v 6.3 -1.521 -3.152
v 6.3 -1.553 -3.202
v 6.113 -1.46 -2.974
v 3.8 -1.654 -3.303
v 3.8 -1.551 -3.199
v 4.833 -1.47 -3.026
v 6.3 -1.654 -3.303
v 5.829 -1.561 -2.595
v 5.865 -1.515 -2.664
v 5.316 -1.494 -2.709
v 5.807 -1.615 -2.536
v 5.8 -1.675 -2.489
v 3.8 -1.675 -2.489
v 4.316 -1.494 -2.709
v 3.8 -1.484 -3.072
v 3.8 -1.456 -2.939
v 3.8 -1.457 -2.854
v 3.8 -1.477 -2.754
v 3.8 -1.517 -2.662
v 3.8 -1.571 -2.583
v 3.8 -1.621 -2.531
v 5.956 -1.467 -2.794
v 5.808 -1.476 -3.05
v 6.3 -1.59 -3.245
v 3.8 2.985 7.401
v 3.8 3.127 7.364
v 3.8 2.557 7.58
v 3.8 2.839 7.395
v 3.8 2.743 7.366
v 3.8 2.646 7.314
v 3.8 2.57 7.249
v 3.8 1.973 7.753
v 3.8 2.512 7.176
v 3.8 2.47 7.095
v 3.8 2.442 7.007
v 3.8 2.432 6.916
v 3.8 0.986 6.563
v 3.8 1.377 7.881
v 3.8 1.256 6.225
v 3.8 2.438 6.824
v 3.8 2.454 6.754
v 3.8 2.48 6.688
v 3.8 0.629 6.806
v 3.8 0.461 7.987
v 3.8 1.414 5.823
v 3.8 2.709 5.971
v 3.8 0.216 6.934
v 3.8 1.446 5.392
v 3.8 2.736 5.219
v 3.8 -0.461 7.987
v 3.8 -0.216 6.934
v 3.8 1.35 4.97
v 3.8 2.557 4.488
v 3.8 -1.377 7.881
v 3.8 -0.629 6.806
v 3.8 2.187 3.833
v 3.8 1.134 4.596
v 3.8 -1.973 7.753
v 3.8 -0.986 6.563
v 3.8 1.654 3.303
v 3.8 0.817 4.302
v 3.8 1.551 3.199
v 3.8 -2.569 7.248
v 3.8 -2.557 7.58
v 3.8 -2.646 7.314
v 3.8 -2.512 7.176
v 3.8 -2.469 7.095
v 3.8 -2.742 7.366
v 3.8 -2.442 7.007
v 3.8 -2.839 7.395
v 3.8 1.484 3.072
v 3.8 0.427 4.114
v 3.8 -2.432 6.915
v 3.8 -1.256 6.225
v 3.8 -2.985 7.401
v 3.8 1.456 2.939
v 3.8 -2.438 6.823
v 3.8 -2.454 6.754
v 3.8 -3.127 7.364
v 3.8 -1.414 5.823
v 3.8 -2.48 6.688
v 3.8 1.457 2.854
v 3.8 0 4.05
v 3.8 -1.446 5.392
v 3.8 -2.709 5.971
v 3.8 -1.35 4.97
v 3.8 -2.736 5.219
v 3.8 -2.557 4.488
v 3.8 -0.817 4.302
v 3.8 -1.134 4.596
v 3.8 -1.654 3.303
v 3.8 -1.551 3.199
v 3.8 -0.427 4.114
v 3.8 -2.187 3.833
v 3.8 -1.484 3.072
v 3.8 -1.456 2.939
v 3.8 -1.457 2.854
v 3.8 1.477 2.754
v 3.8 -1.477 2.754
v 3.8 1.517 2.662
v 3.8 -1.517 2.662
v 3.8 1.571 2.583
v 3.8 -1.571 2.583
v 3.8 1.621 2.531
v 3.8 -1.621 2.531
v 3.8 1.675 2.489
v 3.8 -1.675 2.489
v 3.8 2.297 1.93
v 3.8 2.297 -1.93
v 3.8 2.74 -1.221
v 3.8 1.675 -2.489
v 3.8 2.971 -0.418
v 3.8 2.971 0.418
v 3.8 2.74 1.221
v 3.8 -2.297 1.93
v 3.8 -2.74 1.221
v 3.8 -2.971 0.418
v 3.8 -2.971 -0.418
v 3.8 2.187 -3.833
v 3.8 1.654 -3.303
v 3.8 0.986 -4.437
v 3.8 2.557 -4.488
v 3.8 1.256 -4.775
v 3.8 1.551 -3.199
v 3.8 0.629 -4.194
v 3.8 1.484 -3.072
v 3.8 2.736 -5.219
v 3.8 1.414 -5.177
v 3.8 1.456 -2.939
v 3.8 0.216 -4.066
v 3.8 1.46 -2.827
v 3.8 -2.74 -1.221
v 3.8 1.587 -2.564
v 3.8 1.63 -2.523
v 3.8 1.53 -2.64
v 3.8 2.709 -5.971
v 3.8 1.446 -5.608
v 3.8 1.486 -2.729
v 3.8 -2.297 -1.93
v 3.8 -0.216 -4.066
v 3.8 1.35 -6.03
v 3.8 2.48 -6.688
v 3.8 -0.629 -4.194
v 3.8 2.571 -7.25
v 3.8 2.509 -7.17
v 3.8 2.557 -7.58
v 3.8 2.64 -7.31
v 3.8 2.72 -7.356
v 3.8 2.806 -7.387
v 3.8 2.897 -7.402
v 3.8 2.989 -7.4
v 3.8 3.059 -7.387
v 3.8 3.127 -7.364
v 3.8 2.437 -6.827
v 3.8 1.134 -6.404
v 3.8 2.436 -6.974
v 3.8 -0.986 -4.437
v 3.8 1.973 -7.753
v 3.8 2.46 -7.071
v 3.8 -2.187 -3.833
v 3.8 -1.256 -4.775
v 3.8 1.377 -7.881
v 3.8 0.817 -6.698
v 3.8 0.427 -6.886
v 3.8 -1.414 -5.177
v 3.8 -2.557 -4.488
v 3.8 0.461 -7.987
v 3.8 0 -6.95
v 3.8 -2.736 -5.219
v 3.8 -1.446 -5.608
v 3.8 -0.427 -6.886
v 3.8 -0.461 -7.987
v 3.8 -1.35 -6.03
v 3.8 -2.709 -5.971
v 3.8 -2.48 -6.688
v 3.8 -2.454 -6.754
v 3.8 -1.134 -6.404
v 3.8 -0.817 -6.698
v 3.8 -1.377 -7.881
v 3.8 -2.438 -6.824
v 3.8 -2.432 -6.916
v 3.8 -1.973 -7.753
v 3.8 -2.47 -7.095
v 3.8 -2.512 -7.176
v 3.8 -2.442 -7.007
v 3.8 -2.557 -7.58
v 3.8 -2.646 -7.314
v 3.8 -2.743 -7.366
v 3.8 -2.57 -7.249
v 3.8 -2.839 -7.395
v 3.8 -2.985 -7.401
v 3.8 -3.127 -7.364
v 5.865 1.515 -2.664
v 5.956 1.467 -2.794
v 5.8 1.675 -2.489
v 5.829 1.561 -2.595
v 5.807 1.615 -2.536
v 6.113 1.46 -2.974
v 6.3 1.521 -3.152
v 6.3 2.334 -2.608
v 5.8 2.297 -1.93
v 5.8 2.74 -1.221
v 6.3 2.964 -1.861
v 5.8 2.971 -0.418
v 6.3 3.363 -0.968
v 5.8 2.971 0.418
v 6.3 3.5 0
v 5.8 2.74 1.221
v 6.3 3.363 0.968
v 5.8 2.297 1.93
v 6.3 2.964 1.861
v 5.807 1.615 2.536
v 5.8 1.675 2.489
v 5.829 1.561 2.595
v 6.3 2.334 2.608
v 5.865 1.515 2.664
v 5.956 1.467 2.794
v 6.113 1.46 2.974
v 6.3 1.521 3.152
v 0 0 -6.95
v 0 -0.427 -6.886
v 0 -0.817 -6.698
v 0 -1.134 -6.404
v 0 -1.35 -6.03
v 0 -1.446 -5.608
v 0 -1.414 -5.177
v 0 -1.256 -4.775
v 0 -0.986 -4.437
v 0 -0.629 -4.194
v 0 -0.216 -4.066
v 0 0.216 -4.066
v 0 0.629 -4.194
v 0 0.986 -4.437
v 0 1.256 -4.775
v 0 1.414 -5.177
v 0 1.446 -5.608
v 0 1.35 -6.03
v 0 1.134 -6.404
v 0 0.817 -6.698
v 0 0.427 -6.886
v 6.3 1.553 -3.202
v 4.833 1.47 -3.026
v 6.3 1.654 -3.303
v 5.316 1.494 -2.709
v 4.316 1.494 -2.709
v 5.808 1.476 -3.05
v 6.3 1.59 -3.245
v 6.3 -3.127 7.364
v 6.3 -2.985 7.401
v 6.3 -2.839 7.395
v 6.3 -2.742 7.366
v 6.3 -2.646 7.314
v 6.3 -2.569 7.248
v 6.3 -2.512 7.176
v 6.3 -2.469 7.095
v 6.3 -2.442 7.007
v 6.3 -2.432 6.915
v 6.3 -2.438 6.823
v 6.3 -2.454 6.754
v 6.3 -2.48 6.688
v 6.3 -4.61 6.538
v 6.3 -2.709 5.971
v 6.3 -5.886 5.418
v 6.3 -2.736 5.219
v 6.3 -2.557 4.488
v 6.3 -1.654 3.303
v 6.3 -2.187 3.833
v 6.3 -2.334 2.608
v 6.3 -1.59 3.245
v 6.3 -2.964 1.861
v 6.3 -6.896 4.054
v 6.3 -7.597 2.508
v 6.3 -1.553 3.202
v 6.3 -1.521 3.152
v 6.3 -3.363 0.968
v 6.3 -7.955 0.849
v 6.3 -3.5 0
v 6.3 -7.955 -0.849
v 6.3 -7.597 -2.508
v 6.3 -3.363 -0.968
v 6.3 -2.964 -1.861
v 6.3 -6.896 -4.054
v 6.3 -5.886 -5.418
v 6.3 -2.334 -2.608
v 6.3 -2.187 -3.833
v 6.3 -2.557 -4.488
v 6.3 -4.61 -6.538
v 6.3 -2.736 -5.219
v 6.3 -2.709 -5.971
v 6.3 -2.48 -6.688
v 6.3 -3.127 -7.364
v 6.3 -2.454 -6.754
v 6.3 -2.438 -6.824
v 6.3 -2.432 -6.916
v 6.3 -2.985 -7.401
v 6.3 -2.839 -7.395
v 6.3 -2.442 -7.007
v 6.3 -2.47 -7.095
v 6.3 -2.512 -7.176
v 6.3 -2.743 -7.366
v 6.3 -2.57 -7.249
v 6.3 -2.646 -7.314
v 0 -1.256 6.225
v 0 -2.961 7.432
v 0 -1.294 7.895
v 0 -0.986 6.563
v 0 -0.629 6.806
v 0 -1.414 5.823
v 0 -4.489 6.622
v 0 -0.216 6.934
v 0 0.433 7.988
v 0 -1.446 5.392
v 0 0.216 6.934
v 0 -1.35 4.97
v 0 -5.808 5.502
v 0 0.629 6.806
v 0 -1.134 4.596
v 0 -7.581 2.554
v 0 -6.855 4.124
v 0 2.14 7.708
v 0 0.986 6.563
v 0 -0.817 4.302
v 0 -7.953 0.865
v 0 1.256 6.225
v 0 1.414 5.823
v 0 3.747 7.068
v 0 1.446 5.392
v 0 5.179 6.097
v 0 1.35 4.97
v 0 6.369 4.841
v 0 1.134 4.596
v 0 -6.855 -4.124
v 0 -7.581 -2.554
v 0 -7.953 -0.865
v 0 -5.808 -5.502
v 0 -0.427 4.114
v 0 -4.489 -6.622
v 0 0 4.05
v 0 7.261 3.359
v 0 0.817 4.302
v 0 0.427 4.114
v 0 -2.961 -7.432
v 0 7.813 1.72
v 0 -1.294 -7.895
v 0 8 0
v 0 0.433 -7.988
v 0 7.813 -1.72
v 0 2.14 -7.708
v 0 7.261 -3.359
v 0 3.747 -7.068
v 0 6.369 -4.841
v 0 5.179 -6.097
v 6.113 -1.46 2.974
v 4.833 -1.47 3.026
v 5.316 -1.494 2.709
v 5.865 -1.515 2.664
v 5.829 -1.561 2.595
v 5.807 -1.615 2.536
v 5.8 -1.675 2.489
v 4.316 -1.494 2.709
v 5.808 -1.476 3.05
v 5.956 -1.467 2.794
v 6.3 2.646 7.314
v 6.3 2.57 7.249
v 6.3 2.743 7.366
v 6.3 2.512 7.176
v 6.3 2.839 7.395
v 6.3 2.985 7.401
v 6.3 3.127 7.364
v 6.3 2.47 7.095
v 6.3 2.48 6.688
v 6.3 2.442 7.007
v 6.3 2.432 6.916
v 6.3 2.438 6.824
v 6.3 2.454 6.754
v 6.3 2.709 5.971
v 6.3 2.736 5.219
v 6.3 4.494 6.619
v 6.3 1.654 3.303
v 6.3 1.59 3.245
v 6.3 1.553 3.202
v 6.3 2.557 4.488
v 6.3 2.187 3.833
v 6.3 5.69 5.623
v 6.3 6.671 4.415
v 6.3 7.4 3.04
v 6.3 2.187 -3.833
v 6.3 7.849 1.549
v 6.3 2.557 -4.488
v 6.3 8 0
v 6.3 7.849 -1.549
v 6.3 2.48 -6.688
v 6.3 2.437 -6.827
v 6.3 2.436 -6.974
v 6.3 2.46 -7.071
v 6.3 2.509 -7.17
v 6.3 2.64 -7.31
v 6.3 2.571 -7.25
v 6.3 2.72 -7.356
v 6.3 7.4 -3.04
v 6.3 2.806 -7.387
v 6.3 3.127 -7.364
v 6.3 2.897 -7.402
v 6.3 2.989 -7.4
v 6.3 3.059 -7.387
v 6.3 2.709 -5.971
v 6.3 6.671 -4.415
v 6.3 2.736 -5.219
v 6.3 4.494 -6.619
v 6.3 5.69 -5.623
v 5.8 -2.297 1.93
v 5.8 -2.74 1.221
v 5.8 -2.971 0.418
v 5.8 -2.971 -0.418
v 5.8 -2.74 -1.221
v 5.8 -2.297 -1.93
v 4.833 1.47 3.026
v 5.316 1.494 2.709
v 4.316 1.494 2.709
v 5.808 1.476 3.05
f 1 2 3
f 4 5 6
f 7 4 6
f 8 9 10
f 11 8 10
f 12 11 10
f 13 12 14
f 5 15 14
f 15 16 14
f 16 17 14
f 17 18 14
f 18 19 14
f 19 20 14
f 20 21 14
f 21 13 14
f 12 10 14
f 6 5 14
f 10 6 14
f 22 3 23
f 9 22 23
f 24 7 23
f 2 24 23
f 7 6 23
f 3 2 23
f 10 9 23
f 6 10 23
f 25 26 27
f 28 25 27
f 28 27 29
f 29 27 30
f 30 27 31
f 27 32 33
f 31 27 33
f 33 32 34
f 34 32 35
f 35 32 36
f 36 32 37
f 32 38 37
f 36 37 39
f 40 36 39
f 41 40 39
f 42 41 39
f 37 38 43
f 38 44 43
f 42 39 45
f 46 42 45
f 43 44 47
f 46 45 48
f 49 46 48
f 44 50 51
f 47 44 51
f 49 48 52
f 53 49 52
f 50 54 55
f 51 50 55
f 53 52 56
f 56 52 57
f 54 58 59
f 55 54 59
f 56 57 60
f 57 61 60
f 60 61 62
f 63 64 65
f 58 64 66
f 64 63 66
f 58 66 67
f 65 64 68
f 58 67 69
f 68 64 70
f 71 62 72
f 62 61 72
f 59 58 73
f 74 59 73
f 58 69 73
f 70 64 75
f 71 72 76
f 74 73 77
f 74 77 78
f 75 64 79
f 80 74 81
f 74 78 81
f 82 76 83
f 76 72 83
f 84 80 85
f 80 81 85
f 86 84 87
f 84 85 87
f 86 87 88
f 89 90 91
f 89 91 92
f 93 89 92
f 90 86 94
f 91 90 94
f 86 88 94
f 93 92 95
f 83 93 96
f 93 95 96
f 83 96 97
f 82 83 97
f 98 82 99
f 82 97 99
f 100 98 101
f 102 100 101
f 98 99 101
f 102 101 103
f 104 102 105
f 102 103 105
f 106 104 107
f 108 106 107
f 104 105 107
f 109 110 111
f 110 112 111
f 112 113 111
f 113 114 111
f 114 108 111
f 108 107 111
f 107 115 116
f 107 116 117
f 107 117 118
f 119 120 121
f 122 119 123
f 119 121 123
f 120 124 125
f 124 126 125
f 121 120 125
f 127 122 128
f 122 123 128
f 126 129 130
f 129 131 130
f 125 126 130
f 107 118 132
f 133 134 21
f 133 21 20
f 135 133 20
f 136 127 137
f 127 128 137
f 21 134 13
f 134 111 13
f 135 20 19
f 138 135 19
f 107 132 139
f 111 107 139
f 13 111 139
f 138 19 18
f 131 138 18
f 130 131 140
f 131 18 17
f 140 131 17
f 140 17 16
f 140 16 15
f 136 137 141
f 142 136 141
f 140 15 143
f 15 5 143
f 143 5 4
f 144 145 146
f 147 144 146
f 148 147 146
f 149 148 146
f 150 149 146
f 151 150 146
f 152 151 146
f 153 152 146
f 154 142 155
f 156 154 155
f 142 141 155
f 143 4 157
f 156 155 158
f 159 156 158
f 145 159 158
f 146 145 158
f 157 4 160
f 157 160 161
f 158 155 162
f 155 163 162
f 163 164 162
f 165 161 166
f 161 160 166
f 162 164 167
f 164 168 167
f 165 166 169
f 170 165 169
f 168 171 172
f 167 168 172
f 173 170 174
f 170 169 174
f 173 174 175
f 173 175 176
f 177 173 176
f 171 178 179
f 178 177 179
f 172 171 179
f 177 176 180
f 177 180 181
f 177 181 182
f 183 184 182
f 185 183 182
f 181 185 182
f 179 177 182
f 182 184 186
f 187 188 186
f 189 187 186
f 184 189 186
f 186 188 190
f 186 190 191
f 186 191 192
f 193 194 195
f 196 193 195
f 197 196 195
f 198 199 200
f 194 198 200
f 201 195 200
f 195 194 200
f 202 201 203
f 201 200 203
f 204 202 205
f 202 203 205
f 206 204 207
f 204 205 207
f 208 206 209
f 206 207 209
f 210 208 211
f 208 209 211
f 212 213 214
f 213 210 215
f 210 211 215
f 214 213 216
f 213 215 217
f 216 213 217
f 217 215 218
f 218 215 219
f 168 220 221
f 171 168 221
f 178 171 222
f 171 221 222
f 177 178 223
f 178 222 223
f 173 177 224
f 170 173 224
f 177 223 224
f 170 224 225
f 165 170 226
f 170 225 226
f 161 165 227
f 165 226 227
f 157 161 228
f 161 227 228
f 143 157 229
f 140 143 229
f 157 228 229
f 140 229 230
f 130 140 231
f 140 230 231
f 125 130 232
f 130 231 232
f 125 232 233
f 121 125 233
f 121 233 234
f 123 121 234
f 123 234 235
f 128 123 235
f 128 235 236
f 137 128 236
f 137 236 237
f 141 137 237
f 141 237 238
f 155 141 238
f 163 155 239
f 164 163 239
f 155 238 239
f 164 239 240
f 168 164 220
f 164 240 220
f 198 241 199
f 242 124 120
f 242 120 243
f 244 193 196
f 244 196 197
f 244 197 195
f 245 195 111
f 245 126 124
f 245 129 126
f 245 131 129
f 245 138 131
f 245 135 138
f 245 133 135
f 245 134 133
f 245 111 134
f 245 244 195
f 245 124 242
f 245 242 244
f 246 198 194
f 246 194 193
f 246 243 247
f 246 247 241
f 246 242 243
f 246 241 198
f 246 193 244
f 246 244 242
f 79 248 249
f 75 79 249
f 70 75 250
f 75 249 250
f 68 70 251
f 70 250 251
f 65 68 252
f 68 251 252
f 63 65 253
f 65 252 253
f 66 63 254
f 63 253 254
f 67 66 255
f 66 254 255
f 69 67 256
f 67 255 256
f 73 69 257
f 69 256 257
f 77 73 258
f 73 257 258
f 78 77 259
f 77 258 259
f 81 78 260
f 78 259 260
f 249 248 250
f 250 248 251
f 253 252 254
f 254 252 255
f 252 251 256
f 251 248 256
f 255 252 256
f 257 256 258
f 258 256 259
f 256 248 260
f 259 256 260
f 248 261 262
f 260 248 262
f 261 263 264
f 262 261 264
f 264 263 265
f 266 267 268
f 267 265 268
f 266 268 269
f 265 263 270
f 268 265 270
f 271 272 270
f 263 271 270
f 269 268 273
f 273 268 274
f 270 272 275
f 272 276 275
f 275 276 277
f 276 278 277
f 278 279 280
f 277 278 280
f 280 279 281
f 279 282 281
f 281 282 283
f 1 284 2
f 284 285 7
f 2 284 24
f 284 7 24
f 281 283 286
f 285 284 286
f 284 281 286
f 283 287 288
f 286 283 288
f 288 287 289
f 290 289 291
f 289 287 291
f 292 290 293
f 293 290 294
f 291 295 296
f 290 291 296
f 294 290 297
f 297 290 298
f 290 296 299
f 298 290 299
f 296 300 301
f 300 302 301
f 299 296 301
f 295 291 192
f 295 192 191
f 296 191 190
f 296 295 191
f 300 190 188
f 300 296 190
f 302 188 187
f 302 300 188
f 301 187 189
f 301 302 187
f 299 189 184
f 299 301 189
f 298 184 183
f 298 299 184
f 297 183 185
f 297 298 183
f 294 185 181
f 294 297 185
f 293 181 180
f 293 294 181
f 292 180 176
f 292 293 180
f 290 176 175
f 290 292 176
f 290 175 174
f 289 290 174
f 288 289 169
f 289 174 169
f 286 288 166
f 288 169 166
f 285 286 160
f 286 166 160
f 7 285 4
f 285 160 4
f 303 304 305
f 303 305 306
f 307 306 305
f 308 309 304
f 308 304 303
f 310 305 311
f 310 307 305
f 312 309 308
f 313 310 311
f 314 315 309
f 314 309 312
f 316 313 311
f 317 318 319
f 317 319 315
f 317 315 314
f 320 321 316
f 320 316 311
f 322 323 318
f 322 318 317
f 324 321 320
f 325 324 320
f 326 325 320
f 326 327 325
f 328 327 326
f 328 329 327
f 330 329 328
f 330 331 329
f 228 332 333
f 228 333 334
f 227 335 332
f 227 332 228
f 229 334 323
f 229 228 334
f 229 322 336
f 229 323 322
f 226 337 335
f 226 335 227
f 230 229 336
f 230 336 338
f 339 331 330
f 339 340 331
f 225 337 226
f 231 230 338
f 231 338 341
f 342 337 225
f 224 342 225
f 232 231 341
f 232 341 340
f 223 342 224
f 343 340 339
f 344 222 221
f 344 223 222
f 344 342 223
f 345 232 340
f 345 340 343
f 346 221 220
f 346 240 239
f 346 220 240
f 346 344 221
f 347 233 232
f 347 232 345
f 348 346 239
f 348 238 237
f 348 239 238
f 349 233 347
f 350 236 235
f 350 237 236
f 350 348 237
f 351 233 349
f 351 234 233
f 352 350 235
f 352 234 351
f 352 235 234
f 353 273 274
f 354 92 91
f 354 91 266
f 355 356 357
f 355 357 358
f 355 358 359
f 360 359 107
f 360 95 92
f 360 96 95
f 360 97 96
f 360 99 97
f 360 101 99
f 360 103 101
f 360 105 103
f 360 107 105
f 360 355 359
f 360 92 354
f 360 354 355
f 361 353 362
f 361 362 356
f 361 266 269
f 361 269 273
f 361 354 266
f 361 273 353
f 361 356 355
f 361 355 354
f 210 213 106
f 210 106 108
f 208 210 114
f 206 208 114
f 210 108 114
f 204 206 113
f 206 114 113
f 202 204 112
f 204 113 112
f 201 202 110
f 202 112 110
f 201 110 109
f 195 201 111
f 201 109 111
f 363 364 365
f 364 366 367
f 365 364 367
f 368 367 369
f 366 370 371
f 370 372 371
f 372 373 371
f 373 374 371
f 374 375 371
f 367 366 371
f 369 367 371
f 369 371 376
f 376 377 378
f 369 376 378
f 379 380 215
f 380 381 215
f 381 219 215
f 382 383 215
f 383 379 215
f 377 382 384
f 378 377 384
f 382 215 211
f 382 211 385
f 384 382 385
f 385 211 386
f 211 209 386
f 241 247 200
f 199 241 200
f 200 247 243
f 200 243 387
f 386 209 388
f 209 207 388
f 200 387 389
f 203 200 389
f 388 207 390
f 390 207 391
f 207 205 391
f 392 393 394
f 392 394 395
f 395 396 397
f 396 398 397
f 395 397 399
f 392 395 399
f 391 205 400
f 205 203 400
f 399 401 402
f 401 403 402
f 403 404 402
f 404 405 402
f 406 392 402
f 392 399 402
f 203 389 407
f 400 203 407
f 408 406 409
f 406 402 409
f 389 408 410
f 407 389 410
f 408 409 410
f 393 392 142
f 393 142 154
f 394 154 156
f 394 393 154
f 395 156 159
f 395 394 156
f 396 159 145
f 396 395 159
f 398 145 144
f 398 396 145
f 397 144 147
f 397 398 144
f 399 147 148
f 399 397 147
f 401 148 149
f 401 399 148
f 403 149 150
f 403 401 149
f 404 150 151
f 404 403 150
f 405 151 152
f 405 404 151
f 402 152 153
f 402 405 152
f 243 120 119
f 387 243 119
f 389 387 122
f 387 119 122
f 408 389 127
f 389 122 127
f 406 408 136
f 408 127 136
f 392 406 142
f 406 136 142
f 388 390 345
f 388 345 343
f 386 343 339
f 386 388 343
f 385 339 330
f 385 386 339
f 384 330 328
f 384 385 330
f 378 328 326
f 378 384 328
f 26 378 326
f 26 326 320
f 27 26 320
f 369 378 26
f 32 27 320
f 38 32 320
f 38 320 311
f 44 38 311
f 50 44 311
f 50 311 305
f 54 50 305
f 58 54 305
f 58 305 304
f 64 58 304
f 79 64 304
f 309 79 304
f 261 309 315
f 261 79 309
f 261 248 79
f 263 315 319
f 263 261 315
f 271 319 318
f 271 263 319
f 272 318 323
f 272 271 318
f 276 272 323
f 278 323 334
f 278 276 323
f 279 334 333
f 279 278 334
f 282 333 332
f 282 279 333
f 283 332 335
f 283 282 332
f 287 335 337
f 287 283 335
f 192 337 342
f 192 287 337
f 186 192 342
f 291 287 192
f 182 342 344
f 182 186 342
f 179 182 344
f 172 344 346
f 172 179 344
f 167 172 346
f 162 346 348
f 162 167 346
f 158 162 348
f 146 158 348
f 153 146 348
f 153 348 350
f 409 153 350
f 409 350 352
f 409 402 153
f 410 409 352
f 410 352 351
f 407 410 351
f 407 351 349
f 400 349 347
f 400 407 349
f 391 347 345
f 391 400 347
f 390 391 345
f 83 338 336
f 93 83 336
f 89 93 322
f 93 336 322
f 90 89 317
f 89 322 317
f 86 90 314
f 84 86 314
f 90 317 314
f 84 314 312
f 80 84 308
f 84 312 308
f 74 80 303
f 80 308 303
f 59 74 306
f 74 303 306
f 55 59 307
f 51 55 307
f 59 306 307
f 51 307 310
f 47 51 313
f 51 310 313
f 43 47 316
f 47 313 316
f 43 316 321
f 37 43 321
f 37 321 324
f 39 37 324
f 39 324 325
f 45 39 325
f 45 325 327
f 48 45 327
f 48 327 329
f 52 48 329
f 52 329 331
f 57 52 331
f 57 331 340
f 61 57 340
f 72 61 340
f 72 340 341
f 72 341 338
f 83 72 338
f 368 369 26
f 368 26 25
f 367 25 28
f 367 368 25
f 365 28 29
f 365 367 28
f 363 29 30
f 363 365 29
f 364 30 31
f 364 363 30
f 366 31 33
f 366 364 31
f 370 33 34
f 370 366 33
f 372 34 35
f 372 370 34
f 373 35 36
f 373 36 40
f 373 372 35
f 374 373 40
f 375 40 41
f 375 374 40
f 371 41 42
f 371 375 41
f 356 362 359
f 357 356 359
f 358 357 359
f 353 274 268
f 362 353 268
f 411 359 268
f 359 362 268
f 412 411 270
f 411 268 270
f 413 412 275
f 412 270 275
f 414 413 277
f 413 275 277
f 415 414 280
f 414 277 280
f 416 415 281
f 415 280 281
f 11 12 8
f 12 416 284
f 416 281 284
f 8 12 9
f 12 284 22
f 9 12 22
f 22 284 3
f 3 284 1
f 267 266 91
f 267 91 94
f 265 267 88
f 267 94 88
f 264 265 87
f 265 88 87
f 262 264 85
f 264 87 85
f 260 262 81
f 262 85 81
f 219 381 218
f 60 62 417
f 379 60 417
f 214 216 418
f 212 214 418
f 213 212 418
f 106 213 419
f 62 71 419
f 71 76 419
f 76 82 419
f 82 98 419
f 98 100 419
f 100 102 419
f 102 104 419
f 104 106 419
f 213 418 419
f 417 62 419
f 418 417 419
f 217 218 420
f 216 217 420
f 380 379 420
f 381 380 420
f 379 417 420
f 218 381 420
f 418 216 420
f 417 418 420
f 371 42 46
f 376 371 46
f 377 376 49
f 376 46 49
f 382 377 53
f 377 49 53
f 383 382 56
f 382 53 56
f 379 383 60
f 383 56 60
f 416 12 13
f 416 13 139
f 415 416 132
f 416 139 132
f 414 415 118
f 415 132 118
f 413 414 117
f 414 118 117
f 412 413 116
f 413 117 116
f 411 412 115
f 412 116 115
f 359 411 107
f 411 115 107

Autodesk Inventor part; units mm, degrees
ref_plane "YZ Plane" through (0, 0, 0) normal (1, 0, 0) x (0, 1, 0)
ref_plane "XZ Plane" through (0, 0, 0) normal (0, 1, 0) x (-1, 0, 0)
ref_plane "XY Plane" through (0, 0, 0) normal (0, 0, 1) x (1, 0, 0)
sketch "スケッチ1" plane through (0, 0, 0) normal (0, 0, 1) x (1, 0, 0)
  line L0 (0, 0) -> (0, 3.5)
  line L1 (0, 3.5) -> (0, 3.5)
  line L2 (0, 3.5) -> (0, 8)
  line L3 (0, 8) -> (6.3, 8)
  line L4 (6.3, 8) -> (6.3, 3)
  line L5 (6.3, 3) -> (3.8, 3)
  line L6 (3.8, 3) -> (3.8, 0)
  line L7 (3.8, 0) -> (0, 0)
  dimension "d0" = 3.5
  dimension "d1" = 3
  dimension "d2" = 2.5
  dimension "d4" = 0
  dimension "d5" = 8
  dimension "d34" = 3.8
revolve "回転1" add sketch "スケッチ1" angle 360 about axis through (3.8, 0, 0) along (-1, 0, 0)
sketch "スケッチ2" plane through (6.3, 0, 0) normal (1, 0, 0) x (0, 0, -1)
  point P0 (0, 0)
  point P1 (-5.5, 0)
  point P2 (5.5, 0)
  dimension "d10" = 5.5
  dimension "d11" = 5.5
hole "穴1" at (6.3, 0, 5.5) at (6.3, 0, -5.5) direction (-1, 0, 0) diameter 2.9 end through all counterbore diameter 5.5 counterbore depth 2.5 clearance for "Socket Head Cap Screw" size "M2.5" standard "Ansi Metric M Profile"
chamfer "面取り5" distance 0.5 angle 45 2 edges at (6.3, 3, 0) (6.3, -3, 0)
fillet "フィレット2" radius 0.5 8 edges at (4.8, 0.8377, -2.8807) (4.8, 0.8377, 2.8807) (4.8, -0.8377, 2.8807) (4.8, -0.8377, -2.8807) (5.05, 1.3765, -7.8807) (5.05, 1.3765, 7.8807) (5.05, -1.3765, 7.8807) (5.05, -1.3765, -7.8807)
properties part number "unit-base4" material "ABS プラスチック"
